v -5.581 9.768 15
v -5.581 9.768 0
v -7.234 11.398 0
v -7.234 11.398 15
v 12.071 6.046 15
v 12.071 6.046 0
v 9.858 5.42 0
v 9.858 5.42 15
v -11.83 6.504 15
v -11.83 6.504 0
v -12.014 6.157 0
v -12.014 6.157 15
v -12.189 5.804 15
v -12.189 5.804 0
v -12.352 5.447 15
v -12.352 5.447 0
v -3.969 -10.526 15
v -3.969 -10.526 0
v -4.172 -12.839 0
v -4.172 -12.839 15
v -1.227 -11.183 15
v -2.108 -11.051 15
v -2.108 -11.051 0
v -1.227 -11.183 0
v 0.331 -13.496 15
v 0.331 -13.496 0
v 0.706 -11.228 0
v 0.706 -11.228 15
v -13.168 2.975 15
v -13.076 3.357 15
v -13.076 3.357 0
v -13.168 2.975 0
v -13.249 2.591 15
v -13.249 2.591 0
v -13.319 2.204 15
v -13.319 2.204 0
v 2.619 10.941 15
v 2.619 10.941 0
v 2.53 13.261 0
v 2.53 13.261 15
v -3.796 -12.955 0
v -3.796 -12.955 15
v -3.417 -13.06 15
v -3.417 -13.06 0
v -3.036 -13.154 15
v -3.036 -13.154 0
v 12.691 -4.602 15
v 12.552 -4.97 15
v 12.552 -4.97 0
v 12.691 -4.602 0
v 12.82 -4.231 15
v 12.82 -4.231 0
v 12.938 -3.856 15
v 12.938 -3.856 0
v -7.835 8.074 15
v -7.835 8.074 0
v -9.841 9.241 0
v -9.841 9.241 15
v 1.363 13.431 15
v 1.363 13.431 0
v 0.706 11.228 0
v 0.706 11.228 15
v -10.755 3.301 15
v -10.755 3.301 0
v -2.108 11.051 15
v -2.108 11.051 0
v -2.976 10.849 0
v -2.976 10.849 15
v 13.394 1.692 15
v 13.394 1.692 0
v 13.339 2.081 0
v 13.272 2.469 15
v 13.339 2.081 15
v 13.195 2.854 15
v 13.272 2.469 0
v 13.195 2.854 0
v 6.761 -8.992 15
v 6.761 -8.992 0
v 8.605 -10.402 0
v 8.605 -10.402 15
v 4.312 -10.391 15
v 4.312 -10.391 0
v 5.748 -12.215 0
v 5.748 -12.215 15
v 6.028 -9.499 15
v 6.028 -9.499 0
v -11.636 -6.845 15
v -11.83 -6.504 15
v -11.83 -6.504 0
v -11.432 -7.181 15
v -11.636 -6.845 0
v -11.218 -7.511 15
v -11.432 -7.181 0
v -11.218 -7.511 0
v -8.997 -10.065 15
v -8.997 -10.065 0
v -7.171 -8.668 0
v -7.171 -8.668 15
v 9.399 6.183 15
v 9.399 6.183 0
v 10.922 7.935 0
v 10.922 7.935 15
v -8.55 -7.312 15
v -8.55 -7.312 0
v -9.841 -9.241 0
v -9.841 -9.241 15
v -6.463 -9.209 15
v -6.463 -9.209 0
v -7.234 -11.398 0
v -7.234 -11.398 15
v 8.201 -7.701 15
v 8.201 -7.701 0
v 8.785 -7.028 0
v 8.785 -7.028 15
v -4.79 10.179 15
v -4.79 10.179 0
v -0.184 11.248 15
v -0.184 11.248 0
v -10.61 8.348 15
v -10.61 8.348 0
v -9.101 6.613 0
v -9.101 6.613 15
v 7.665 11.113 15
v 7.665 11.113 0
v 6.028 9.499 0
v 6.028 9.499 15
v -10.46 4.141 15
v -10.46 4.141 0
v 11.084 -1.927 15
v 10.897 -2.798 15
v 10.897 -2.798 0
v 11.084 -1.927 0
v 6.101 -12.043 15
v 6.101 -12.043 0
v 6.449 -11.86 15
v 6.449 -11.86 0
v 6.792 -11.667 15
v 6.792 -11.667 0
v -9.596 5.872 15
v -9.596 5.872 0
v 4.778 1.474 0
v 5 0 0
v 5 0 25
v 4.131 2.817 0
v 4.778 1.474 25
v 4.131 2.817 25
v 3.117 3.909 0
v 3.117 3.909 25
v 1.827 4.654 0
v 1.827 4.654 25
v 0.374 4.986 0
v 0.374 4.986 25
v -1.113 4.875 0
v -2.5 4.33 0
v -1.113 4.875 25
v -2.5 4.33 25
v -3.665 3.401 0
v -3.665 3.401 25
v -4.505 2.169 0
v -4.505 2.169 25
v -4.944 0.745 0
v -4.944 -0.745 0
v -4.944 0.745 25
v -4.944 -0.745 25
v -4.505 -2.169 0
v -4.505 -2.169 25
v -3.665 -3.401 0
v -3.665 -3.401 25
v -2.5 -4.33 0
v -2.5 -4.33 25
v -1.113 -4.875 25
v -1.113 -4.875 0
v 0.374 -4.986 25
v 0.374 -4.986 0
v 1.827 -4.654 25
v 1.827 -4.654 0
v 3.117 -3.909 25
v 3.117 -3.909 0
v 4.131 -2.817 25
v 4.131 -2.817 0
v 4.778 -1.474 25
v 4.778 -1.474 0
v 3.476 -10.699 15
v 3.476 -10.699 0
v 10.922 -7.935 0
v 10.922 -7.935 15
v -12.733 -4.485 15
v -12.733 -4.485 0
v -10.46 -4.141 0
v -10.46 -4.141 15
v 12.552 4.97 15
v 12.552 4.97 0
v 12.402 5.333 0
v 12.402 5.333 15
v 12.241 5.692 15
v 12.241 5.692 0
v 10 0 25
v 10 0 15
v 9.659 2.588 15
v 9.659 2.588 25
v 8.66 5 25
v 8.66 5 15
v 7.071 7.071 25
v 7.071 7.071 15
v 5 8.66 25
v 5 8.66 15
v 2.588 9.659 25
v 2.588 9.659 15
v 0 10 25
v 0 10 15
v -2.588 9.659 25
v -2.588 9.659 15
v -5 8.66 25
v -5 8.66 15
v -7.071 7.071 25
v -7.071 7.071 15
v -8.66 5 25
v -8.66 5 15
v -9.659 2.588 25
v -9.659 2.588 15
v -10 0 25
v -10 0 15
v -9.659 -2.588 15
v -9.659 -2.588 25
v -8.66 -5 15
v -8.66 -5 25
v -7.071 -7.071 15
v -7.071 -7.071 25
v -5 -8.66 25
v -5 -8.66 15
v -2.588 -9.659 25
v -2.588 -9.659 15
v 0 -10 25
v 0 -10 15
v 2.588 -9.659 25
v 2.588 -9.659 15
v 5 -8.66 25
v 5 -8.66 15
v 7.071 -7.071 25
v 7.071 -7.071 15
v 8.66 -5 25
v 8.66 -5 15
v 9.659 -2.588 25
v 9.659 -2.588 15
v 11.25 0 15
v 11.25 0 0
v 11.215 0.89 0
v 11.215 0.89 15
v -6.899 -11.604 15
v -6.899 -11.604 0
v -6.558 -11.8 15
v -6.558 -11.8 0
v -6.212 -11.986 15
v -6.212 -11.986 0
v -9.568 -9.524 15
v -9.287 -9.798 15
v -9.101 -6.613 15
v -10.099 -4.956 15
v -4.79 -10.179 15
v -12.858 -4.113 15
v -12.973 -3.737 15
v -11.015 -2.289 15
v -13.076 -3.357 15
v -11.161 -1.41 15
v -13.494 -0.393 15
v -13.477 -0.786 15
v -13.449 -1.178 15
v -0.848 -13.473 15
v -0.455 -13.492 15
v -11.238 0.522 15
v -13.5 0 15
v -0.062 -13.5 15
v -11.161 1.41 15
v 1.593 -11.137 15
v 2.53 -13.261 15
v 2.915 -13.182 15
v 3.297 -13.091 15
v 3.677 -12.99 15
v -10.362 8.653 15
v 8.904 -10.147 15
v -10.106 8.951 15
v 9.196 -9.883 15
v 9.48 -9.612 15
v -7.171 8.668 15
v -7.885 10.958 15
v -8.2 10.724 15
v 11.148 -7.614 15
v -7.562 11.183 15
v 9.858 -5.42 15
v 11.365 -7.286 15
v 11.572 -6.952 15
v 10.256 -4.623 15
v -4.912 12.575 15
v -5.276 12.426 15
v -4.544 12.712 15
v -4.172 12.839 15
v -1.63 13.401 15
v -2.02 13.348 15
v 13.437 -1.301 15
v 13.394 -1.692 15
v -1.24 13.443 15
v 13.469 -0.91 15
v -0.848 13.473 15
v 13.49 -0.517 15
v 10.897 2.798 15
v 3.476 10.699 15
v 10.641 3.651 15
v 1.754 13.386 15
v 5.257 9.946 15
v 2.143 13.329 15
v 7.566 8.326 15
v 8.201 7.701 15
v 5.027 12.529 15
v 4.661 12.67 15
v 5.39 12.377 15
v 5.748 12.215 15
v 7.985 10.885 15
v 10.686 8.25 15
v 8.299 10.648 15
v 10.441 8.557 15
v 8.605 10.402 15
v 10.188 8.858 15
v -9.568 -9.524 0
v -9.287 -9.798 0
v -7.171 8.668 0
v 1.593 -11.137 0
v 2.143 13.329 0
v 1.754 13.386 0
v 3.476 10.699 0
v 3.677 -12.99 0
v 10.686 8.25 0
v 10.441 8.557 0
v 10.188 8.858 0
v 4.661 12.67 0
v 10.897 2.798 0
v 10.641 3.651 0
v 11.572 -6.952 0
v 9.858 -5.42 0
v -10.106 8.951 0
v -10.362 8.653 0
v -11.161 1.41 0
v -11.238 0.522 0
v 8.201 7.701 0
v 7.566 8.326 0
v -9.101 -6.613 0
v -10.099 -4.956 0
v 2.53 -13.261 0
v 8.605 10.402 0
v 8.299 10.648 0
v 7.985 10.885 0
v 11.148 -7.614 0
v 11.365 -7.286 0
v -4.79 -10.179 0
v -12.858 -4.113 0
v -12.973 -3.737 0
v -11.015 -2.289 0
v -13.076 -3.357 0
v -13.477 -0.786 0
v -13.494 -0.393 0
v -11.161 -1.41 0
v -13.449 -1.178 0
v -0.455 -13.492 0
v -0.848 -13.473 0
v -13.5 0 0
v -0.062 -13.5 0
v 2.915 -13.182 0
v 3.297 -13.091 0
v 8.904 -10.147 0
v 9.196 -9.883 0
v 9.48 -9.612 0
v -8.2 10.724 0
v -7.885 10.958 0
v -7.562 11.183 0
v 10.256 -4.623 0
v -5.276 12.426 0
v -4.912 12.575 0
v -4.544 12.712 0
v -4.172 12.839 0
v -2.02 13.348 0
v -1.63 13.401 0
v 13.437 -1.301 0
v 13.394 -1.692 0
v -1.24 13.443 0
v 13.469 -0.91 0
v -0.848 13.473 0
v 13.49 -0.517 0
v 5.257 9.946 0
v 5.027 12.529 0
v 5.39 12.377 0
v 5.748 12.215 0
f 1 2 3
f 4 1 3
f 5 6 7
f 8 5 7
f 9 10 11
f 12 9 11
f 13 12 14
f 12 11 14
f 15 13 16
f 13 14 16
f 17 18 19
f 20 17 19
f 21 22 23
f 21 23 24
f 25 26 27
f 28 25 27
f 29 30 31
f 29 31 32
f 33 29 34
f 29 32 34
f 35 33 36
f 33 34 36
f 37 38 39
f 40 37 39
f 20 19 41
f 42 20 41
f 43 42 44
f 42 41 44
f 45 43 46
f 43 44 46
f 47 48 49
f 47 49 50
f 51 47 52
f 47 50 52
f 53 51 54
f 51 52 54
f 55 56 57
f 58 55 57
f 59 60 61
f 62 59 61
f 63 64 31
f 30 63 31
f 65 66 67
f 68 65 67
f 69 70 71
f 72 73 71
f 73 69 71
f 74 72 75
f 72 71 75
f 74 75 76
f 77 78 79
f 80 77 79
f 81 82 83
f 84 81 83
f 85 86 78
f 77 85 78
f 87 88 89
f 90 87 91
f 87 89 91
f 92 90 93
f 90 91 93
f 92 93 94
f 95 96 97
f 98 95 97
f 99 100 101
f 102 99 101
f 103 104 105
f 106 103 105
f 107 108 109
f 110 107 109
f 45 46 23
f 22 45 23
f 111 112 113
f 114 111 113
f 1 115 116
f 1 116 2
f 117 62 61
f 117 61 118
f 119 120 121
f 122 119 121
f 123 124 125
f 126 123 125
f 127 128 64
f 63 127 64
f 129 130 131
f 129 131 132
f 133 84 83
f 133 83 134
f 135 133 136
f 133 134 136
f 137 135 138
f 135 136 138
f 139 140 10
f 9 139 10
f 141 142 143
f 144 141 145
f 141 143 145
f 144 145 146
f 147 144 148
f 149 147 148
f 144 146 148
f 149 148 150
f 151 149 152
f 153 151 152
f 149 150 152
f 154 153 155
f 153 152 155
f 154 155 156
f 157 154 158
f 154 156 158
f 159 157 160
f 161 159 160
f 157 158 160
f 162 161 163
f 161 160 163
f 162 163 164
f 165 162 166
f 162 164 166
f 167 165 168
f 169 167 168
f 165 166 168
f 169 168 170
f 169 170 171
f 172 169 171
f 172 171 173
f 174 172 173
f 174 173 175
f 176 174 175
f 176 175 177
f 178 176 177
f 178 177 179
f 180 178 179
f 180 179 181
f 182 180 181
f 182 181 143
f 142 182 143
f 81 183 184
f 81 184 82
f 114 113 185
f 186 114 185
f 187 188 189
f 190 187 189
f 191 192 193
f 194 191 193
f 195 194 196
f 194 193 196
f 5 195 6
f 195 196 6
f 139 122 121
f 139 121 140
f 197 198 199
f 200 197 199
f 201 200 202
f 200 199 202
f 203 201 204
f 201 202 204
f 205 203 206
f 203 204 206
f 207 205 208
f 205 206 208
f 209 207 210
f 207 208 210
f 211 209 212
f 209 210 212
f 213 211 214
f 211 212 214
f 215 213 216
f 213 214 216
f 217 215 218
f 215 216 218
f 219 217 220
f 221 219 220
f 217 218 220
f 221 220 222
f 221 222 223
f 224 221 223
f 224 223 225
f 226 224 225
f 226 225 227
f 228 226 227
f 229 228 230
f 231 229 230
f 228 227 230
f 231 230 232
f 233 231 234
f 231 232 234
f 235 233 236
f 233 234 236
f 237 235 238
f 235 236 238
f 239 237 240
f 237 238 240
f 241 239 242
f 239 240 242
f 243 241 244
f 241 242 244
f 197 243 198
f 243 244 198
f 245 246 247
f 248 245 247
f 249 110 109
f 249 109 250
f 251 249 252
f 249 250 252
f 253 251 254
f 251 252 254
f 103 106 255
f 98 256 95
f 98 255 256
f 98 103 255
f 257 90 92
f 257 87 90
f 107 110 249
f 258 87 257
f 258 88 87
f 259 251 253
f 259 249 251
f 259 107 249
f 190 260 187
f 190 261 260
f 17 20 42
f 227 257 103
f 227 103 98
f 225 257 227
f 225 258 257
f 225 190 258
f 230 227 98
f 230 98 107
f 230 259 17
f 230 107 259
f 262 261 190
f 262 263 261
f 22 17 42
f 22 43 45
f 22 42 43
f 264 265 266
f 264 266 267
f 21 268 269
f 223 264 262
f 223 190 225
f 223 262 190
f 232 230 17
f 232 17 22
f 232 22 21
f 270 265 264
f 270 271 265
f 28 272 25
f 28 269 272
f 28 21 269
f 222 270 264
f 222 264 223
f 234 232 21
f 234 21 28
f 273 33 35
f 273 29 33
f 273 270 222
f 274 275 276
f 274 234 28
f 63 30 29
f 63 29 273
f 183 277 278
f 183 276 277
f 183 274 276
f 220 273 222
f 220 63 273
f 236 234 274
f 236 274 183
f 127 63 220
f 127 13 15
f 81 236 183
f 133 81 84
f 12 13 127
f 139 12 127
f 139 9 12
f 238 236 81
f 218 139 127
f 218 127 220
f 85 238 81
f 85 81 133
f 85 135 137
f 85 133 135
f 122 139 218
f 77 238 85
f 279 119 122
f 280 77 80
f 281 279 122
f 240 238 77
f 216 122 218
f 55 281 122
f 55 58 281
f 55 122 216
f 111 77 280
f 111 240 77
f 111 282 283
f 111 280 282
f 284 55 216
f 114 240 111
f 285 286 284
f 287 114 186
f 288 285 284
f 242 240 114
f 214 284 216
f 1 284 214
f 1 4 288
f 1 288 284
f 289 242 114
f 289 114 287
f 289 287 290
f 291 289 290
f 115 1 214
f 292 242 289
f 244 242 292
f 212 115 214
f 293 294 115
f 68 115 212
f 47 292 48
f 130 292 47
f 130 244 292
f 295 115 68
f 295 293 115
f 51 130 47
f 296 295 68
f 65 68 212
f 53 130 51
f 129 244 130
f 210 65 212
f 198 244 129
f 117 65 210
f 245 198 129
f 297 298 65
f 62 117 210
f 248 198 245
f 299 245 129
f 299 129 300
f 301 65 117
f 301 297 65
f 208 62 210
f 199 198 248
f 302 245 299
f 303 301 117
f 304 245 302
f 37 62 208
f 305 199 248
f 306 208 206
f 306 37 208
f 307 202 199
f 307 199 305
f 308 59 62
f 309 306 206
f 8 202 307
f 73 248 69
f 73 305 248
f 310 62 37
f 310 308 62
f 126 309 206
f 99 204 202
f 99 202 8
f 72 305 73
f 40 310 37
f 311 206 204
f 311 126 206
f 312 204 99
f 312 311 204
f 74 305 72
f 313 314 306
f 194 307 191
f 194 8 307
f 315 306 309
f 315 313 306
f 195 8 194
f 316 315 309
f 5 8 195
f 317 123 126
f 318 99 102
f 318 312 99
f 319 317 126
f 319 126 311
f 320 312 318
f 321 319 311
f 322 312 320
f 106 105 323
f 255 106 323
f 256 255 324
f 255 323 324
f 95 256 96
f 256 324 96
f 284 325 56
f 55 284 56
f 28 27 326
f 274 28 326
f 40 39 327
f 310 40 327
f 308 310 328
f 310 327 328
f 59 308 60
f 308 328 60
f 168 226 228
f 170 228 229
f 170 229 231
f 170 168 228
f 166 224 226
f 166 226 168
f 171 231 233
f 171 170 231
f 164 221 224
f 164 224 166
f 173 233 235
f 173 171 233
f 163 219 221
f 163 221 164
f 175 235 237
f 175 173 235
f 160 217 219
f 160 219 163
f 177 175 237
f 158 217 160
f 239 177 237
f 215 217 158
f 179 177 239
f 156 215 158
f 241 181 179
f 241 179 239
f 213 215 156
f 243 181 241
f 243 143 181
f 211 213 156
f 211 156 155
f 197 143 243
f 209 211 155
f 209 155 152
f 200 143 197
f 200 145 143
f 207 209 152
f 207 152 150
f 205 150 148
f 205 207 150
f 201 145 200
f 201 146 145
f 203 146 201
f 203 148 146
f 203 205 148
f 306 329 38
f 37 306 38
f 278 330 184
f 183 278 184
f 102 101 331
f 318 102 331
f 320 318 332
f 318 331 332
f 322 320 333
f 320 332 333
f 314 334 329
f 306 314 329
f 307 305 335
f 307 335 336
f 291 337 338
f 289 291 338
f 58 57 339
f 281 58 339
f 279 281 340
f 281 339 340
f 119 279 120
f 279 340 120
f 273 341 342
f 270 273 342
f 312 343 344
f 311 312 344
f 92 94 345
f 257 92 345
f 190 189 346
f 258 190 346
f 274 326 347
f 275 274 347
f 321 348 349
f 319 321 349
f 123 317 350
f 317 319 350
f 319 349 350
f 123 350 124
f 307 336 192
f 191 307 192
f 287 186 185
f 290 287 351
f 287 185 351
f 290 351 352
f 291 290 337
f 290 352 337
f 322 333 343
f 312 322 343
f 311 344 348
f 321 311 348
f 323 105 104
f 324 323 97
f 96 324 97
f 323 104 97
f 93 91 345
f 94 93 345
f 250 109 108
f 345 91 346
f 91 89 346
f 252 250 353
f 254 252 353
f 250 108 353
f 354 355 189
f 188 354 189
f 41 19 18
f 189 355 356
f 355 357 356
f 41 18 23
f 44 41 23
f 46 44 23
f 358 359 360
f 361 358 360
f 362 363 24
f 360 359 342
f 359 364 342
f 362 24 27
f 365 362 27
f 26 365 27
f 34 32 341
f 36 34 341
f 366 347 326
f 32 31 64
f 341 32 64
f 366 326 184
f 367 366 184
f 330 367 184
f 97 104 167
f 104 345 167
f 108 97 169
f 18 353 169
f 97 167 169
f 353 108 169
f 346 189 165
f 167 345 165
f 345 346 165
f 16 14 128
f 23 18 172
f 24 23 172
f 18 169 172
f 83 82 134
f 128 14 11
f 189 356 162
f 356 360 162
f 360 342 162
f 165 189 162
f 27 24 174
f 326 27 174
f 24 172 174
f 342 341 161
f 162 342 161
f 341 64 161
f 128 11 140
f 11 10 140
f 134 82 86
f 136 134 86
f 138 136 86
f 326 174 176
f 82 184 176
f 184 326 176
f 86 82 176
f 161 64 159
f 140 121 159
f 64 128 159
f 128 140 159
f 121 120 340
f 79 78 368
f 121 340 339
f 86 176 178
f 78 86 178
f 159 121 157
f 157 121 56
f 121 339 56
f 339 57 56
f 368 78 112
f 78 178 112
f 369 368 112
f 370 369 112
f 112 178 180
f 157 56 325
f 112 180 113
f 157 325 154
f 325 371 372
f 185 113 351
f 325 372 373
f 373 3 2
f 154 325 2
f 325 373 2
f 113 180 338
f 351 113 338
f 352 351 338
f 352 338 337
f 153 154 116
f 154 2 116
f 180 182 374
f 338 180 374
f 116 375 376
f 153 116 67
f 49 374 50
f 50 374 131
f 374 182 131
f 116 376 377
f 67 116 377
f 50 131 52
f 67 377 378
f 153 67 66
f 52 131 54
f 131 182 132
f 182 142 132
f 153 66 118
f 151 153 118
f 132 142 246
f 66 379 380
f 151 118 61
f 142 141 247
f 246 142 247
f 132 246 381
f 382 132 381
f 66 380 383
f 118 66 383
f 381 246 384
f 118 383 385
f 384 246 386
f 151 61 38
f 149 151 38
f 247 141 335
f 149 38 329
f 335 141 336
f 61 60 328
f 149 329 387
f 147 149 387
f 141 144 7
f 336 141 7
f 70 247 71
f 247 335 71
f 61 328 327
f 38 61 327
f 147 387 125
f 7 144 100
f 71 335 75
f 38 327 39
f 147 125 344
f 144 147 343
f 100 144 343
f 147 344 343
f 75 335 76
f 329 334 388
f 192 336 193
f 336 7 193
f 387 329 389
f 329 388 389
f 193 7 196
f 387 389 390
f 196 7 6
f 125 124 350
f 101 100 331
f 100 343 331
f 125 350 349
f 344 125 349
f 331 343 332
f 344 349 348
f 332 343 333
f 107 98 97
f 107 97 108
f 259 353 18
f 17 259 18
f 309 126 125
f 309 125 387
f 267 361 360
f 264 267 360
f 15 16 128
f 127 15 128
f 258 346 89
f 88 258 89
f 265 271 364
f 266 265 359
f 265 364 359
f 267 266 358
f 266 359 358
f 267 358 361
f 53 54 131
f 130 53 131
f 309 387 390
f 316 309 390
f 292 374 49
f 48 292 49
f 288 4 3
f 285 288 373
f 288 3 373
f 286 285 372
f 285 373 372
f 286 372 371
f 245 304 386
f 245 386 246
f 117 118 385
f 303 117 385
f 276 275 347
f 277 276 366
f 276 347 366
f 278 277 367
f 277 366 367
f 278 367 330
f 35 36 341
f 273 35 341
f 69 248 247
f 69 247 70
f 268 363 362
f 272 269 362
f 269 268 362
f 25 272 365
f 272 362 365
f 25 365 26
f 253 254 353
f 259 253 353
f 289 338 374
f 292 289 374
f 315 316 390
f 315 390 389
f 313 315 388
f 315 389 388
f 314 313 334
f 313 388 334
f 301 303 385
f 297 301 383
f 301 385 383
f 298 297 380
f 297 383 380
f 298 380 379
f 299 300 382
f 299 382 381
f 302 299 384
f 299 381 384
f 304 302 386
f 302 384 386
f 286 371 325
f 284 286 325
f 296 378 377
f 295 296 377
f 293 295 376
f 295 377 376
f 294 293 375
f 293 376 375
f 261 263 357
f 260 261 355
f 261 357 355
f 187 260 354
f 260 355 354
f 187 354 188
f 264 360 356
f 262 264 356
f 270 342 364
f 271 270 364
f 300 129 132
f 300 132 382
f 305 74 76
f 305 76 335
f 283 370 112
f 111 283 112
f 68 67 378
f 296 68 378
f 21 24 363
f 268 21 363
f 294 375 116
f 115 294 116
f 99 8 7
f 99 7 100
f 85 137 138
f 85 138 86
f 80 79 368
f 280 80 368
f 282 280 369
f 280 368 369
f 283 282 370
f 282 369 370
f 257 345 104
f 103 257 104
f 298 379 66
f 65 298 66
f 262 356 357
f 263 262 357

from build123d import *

# Parameters (mm, degrees)
F0_R            = 13.5
F1_DEPTH        = 15
F2_R            = 10
F3_DEPTH        = 10
F4_R            = 5
F5_DEPTH        = 25.001
F7_DEPTH        = 25.001
F7_COPIES_COUNT = 25


# Not quite as in the source:
# - a pattern or mirror of a feature is missing from the dataset's text; its kind, count and spacing are read off the source's solid


with BuildPart() as f1:
    # F0 (on Top) → F1 (new body)
    with BuildSketch(Plane.XY):
        Circle(F0_R)
    extrude(amount=F1_DEPTH)

    # F2 (on face) → F3 (join)
    with BuildSketch(Plane.XY.offset(15)):
        Circle(F2_R)
    extrude(amount=F3_DEPTH)

    # F4 (on face) → F5 (cut, through all)
    with BuildSketch(Plane.XY.offset(25)):
        Circle(F4_R)
    extrude(amount=-F5_DEPTH, mode=Mode.SUBTRACT)

    # F6 (on face) → F7 (cut, through all)
    with BuildSketch(Plane(origin=(0, 0, 0), x_dir=(1, 0, 0), z_dir=(0, 0, -1))):
        with BuildLine():
            Line((-13.3188989942, -2.2038442736), (-11.1612903898, -1.4099988776))
            Line((-11.1612903898, -1.4099988776), (-11.2378712938, -0.5222535625))
            Line((-11.2378712938, -0.5222535625), (-13.5, 0))
            ThreePointArc((-13.5, 0), (-13.4546485726, -1.1056363729), (-13.3188989942, -2.2038442736))
        make_face()
    f7 = extrude(amount=-F7_DEPTH, mode=Mode.SUBTRACT)

    # F7_copies: F7 ×25 about axis
    f7_copies_axis = Axis((0, 0, 0), (0, 0, 1))
    for i in range(1, F7_COPIES_COUNT):
        add(f7.rotate(f7_copies_axis, i * 360 / F7_COPIES_COUNT), mode=Mode.SUBTRACT)


solid = f1.part
